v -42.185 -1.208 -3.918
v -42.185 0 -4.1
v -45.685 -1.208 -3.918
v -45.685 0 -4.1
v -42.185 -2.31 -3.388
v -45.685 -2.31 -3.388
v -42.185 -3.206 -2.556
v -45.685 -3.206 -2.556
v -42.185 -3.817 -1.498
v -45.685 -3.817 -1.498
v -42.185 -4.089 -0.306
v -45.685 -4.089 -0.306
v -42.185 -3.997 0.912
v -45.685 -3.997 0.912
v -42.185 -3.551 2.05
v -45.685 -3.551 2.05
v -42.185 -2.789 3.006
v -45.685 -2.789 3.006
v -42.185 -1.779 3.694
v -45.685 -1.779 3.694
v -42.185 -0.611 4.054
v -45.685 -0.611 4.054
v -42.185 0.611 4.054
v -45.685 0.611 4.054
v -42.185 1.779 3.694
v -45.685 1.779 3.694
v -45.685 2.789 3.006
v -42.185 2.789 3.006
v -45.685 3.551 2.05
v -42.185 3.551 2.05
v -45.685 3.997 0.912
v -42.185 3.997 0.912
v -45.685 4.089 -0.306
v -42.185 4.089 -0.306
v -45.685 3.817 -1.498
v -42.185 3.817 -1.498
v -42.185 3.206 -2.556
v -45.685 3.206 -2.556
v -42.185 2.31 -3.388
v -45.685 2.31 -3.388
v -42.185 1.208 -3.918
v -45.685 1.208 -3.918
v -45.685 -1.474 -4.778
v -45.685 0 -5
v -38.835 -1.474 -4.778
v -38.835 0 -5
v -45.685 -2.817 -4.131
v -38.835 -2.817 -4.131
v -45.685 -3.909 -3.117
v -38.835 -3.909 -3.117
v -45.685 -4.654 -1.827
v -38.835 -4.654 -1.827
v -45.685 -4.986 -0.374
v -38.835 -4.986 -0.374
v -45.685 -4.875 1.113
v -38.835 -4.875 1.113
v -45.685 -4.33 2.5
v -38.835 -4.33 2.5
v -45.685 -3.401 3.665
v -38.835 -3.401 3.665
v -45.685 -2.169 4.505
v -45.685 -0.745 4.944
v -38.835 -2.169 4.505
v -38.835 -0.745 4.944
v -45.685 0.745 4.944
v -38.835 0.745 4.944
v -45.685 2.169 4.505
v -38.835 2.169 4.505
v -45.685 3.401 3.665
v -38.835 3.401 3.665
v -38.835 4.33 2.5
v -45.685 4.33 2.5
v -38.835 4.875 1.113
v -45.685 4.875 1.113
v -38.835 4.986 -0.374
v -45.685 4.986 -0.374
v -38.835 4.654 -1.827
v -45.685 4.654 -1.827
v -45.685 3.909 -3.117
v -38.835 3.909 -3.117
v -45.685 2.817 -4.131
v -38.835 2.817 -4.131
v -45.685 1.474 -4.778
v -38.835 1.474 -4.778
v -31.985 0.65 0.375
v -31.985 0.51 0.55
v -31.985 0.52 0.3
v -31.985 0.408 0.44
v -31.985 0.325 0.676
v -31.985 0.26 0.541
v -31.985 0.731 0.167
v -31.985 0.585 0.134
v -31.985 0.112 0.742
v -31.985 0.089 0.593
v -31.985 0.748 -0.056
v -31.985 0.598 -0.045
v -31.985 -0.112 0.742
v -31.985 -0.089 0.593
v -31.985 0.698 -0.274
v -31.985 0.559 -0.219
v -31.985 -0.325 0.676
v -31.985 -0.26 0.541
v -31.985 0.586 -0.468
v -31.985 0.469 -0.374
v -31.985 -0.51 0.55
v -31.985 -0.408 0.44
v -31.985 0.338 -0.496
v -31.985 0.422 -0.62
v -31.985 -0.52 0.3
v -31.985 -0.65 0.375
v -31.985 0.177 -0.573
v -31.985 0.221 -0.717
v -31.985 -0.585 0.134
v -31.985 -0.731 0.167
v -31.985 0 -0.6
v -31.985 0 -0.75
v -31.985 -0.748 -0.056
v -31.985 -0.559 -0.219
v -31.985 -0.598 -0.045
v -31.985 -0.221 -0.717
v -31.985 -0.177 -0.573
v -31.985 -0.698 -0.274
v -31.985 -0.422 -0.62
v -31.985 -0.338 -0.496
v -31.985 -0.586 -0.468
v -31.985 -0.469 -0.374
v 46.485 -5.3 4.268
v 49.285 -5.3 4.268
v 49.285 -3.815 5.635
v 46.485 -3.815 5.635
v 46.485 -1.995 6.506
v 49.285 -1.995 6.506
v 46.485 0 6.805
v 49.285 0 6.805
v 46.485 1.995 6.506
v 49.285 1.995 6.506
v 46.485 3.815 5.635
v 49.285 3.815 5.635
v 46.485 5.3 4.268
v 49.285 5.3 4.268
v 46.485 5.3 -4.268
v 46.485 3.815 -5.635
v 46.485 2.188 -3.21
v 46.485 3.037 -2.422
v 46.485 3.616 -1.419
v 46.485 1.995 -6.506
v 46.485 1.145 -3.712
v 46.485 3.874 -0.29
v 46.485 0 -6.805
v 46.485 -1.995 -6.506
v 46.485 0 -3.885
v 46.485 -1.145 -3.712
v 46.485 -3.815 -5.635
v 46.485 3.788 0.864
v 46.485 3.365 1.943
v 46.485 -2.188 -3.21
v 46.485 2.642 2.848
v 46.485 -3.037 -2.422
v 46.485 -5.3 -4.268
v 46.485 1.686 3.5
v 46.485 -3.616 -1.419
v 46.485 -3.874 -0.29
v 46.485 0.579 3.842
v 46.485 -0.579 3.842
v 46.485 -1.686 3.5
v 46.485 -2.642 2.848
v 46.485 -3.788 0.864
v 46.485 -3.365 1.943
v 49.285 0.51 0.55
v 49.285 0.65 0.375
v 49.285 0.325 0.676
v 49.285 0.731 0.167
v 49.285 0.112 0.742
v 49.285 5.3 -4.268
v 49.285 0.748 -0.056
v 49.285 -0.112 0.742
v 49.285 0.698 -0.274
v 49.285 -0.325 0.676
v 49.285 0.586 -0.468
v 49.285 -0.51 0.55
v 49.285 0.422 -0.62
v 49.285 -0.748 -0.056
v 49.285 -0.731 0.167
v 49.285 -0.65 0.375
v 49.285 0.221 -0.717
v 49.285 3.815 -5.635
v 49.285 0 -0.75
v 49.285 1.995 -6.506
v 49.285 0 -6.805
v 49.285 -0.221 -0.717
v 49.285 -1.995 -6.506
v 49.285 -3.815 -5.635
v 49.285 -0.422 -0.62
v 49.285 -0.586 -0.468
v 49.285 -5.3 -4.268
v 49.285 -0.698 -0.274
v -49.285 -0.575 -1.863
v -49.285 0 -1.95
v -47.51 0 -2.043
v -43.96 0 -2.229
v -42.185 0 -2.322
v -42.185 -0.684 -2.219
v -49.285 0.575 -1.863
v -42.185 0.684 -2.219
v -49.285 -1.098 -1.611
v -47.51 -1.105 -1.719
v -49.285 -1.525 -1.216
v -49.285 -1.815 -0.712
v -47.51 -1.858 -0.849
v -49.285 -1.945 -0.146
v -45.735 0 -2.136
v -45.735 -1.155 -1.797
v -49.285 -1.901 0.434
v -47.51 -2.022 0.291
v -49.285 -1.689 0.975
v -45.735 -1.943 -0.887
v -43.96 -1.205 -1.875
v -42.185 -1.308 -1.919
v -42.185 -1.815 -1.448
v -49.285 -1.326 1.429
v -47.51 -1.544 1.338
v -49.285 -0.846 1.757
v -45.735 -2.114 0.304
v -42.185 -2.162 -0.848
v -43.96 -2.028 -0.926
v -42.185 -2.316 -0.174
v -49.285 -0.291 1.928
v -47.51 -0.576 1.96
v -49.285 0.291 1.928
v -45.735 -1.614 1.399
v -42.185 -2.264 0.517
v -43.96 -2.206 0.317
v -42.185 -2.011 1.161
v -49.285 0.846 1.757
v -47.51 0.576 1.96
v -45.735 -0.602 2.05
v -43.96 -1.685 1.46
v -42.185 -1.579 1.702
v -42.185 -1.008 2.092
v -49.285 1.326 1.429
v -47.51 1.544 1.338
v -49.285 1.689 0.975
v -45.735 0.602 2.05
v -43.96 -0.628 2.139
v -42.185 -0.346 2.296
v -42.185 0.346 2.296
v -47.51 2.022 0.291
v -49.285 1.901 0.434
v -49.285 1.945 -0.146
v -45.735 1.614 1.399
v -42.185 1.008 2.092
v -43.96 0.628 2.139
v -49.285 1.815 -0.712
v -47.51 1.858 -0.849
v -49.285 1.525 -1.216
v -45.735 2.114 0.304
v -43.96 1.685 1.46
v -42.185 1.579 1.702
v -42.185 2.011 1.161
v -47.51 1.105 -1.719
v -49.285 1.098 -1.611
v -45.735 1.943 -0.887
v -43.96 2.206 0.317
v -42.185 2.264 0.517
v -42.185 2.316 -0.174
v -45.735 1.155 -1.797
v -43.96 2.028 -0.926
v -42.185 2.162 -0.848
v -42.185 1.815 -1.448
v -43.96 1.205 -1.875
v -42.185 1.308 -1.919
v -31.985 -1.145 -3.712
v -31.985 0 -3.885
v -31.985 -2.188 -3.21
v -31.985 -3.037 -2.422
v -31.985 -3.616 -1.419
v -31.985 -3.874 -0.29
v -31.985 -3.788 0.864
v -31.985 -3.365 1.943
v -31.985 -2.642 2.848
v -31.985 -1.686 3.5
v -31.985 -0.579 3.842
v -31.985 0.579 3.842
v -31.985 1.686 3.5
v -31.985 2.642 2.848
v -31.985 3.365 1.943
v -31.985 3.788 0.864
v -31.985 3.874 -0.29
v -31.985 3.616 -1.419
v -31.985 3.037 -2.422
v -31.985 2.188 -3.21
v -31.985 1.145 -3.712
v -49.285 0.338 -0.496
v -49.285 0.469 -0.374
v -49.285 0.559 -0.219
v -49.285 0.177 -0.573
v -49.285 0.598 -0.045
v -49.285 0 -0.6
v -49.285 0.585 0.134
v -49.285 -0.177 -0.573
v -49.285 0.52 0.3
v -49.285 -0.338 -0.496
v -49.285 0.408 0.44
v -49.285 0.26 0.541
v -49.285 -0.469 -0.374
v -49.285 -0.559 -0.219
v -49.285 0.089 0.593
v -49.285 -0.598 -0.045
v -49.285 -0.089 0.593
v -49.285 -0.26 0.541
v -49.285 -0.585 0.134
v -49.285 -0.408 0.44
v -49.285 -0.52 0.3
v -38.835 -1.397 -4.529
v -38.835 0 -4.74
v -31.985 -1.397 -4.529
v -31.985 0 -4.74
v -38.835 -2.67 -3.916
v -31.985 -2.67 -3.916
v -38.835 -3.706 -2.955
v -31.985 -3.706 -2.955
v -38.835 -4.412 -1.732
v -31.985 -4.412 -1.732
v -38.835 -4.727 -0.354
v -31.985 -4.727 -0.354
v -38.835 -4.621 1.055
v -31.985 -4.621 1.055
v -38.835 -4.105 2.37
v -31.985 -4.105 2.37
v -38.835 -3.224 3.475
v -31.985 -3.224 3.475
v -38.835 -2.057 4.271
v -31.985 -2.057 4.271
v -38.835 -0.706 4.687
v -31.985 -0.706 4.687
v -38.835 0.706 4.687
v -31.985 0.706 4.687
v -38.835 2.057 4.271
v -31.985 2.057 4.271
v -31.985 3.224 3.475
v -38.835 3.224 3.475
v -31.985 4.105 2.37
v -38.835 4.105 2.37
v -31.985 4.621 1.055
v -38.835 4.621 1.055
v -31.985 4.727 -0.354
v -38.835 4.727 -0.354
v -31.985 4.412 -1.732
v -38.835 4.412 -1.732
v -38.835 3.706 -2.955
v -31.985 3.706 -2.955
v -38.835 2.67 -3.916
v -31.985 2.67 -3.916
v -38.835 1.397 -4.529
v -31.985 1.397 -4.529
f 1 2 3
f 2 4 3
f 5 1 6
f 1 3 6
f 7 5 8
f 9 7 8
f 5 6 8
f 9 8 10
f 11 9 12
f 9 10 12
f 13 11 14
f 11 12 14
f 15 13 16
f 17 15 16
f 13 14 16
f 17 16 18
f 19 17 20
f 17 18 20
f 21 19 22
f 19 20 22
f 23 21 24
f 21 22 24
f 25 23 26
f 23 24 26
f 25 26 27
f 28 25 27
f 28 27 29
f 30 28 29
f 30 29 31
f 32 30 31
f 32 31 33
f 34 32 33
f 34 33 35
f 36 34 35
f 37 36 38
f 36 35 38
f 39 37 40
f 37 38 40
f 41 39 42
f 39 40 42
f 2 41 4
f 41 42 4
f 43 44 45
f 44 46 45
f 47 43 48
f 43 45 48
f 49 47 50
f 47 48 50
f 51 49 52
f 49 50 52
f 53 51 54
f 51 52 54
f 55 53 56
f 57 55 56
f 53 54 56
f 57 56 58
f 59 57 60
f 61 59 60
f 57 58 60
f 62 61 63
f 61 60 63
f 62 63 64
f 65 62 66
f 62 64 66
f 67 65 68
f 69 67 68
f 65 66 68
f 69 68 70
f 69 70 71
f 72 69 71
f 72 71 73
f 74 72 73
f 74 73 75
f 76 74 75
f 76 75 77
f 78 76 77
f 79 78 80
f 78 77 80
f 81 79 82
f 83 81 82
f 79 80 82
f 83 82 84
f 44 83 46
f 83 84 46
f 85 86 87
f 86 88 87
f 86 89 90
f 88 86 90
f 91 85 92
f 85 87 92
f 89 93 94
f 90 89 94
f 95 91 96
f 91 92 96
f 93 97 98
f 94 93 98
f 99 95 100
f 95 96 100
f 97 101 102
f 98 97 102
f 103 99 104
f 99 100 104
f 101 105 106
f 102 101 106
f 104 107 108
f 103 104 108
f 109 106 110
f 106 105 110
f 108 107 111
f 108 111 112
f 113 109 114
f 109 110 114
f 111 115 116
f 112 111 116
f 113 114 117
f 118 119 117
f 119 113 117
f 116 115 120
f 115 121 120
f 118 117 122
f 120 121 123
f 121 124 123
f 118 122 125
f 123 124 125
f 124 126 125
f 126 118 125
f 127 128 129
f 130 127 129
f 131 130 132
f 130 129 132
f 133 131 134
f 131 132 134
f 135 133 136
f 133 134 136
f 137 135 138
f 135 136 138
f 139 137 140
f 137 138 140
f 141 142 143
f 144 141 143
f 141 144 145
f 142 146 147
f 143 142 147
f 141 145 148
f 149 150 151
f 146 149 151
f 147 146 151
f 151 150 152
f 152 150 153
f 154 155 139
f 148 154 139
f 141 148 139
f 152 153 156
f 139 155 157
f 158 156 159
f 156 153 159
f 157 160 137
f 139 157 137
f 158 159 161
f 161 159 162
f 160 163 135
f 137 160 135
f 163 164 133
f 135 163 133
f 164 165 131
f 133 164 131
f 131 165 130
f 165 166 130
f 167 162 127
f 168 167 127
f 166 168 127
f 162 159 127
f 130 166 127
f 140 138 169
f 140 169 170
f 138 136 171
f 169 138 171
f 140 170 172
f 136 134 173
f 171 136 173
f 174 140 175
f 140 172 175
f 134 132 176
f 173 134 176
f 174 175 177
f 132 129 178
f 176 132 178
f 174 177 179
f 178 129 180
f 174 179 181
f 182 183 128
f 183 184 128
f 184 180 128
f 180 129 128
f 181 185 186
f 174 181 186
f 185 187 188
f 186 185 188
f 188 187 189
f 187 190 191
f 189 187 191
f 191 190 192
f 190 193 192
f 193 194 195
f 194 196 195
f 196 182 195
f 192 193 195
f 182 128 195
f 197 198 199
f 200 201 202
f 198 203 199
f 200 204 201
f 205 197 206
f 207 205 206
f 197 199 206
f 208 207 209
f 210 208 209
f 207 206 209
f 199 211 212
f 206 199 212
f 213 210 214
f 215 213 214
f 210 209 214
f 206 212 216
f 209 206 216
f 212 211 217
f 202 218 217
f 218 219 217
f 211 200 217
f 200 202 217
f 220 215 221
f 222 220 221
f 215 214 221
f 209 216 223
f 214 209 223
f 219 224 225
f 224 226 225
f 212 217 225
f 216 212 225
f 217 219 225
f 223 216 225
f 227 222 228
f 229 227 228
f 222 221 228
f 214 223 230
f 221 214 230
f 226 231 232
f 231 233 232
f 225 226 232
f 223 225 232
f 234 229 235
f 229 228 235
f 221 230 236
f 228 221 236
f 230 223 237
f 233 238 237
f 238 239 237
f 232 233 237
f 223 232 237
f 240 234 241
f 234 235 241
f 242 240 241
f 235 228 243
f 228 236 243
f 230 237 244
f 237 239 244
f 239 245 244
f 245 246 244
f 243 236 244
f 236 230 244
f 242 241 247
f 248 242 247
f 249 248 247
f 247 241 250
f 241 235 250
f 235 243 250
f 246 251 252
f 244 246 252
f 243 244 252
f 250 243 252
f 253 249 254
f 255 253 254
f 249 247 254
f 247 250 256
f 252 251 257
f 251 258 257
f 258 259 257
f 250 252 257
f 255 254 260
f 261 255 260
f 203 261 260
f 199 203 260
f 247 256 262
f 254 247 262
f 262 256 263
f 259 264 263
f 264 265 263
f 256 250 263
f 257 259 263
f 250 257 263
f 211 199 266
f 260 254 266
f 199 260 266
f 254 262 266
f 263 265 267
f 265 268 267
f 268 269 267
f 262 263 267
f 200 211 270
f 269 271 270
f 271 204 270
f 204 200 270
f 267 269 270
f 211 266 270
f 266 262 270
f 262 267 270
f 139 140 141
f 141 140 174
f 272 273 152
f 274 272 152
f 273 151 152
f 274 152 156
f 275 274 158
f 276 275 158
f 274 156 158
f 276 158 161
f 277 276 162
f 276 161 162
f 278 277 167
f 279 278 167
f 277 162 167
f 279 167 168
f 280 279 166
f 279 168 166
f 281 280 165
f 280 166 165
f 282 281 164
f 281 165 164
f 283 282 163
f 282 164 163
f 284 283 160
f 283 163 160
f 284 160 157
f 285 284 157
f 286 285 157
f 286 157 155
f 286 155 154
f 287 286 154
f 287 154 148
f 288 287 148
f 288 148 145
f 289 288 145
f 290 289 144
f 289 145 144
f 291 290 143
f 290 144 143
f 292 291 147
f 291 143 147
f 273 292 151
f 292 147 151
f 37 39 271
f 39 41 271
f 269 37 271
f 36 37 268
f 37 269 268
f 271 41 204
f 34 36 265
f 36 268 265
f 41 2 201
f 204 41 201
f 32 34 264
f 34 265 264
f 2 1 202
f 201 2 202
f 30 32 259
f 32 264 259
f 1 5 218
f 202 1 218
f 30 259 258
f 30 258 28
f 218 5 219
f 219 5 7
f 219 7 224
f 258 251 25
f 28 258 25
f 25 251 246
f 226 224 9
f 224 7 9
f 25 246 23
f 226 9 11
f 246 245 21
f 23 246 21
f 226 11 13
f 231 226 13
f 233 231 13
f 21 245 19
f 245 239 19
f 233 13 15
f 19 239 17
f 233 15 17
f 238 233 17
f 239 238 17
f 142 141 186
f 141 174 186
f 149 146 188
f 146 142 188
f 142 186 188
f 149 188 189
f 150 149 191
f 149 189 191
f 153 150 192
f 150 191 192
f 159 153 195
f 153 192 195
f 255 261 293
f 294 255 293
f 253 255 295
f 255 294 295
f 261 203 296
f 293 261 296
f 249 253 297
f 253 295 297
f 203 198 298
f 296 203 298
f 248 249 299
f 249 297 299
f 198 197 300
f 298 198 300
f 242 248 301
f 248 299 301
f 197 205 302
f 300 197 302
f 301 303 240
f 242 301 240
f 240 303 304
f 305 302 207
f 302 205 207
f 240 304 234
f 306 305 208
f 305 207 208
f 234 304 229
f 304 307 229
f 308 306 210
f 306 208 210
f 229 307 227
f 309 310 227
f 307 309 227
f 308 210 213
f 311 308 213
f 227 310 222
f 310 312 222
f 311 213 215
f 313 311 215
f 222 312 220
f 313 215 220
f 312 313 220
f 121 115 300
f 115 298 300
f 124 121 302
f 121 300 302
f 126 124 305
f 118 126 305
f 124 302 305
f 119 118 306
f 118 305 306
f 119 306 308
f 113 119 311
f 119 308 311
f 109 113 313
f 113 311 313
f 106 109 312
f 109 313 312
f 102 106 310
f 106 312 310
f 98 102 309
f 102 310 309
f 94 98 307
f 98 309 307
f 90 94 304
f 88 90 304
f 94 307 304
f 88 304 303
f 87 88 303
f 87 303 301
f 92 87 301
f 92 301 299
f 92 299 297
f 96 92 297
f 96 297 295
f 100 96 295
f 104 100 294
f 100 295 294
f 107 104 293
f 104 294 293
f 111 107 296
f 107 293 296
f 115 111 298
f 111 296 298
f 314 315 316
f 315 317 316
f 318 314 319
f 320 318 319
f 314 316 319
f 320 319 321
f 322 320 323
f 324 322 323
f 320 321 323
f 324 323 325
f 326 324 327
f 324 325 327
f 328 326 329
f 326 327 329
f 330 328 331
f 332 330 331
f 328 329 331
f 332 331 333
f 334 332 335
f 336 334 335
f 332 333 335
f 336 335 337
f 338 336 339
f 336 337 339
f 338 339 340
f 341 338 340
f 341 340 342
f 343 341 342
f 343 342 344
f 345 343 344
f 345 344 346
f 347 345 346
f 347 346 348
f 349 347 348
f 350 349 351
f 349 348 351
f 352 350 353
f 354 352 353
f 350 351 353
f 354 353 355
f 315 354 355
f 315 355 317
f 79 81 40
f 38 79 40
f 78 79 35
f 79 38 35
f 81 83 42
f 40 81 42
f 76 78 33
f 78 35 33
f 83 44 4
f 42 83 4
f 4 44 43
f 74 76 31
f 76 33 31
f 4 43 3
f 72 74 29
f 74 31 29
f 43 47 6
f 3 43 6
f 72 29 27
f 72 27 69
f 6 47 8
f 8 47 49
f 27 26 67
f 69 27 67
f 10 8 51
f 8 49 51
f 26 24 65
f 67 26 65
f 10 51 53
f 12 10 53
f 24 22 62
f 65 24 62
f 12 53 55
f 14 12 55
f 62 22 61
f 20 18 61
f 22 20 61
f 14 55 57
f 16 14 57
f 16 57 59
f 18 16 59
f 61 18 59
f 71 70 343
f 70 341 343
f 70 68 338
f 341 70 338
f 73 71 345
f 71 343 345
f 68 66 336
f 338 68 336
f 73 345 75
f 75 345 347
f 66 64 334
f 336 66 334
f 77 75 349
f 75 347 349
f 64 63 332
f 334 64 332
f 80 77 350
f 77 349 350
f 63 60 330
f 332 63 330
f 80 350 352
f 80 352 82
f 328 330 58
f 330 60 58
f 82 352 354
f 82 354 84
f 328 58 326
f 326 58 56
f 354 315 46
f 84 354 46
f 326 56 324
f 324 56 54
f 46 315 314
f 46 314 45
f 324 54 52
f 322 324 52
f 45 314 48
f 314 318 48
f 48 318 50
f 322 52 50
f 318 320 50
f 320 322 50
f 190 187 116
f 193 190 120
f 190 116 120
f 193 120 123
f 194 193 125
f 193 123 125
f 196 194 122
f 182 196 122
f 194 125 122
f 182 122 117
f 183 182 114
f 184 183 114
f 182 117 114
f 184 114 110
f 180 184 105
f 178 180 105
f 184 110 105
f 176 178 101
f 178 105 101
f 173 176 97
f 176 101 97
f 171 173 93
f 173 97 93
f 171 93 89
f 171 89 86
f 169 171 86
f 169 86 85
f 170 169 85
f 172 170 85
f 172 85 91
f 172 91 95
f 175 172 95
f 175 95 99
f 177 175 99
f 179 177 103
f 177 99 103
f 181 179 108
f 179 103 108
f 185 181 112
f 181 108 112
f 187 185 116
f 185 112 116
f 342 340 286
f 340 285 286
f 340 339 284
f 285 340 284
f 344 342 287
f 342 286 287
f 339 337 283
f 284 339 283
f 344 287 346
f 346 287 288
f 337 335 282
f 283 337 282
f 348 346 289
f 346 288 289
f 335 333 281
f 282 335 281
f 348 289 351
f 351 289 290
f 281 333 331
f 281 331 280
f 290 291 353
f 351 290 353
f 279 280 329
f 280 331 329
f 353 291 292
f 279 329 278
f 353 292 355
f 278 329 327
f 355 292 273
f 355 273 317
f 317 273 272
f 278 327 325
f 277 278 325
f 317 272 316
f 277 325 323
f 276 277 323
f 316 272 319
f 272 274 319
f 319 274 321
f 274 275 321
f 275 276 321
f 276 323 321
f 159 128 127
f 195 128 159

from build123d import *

# Parameters (mm, degrees)
SKETCH2_W          = 19
SKETCH2_H          = 14.6
SKETCH2_W_2        = 15
SKETCH2_H_2        = 10.6
CUT_EXTRUDE1_DEPTH = 2.8


with BuildPart() as part:
    # Sketch1 → Revolve1 (revolve)
    with BuildSketch(Plane(origin=(0, 0, 0), x_dir=(1, 0, 0), z_dir=(0, 1, 0))):
        Polygon((-49.285, 0.6), (-49.285, 1.95), (-42.185, 2.322095233), (-42.185, 4.1), (-45.685, 4.1), (-45.685, 5), (-38.835, 5), (-38.835, 4.74), (-31.985, 4.74), (-31.985, 3.885), (46.485, 3.885), (46.485, 6.805), (49.285, 6.805), (49.285, 0.75), (-31.985, 0.75), (-31.985, 0.6), align=None)
    revolve(axis=Axis((49.285, 0, 0), (-1, 0, 0)))

    # Sketch2 → Cut-Extrude1 (cut)
    with BuildSketch(Plane(origin=(49.285, 0, 0), x_dir=(0, 0, -1), z_dir=(1, 0, 0))):
        Rectangle(SKETCH2_W, SKETCH2_H)
        Rectangle(SKETCH2_W_2, SKETCH2_H_2, mode=Mode.SUBTRACT)
    extrude(amount=-CUT_EXTRUDE1_DEPTH, mode=Mode.SUBTRACT)


solid = part.part
